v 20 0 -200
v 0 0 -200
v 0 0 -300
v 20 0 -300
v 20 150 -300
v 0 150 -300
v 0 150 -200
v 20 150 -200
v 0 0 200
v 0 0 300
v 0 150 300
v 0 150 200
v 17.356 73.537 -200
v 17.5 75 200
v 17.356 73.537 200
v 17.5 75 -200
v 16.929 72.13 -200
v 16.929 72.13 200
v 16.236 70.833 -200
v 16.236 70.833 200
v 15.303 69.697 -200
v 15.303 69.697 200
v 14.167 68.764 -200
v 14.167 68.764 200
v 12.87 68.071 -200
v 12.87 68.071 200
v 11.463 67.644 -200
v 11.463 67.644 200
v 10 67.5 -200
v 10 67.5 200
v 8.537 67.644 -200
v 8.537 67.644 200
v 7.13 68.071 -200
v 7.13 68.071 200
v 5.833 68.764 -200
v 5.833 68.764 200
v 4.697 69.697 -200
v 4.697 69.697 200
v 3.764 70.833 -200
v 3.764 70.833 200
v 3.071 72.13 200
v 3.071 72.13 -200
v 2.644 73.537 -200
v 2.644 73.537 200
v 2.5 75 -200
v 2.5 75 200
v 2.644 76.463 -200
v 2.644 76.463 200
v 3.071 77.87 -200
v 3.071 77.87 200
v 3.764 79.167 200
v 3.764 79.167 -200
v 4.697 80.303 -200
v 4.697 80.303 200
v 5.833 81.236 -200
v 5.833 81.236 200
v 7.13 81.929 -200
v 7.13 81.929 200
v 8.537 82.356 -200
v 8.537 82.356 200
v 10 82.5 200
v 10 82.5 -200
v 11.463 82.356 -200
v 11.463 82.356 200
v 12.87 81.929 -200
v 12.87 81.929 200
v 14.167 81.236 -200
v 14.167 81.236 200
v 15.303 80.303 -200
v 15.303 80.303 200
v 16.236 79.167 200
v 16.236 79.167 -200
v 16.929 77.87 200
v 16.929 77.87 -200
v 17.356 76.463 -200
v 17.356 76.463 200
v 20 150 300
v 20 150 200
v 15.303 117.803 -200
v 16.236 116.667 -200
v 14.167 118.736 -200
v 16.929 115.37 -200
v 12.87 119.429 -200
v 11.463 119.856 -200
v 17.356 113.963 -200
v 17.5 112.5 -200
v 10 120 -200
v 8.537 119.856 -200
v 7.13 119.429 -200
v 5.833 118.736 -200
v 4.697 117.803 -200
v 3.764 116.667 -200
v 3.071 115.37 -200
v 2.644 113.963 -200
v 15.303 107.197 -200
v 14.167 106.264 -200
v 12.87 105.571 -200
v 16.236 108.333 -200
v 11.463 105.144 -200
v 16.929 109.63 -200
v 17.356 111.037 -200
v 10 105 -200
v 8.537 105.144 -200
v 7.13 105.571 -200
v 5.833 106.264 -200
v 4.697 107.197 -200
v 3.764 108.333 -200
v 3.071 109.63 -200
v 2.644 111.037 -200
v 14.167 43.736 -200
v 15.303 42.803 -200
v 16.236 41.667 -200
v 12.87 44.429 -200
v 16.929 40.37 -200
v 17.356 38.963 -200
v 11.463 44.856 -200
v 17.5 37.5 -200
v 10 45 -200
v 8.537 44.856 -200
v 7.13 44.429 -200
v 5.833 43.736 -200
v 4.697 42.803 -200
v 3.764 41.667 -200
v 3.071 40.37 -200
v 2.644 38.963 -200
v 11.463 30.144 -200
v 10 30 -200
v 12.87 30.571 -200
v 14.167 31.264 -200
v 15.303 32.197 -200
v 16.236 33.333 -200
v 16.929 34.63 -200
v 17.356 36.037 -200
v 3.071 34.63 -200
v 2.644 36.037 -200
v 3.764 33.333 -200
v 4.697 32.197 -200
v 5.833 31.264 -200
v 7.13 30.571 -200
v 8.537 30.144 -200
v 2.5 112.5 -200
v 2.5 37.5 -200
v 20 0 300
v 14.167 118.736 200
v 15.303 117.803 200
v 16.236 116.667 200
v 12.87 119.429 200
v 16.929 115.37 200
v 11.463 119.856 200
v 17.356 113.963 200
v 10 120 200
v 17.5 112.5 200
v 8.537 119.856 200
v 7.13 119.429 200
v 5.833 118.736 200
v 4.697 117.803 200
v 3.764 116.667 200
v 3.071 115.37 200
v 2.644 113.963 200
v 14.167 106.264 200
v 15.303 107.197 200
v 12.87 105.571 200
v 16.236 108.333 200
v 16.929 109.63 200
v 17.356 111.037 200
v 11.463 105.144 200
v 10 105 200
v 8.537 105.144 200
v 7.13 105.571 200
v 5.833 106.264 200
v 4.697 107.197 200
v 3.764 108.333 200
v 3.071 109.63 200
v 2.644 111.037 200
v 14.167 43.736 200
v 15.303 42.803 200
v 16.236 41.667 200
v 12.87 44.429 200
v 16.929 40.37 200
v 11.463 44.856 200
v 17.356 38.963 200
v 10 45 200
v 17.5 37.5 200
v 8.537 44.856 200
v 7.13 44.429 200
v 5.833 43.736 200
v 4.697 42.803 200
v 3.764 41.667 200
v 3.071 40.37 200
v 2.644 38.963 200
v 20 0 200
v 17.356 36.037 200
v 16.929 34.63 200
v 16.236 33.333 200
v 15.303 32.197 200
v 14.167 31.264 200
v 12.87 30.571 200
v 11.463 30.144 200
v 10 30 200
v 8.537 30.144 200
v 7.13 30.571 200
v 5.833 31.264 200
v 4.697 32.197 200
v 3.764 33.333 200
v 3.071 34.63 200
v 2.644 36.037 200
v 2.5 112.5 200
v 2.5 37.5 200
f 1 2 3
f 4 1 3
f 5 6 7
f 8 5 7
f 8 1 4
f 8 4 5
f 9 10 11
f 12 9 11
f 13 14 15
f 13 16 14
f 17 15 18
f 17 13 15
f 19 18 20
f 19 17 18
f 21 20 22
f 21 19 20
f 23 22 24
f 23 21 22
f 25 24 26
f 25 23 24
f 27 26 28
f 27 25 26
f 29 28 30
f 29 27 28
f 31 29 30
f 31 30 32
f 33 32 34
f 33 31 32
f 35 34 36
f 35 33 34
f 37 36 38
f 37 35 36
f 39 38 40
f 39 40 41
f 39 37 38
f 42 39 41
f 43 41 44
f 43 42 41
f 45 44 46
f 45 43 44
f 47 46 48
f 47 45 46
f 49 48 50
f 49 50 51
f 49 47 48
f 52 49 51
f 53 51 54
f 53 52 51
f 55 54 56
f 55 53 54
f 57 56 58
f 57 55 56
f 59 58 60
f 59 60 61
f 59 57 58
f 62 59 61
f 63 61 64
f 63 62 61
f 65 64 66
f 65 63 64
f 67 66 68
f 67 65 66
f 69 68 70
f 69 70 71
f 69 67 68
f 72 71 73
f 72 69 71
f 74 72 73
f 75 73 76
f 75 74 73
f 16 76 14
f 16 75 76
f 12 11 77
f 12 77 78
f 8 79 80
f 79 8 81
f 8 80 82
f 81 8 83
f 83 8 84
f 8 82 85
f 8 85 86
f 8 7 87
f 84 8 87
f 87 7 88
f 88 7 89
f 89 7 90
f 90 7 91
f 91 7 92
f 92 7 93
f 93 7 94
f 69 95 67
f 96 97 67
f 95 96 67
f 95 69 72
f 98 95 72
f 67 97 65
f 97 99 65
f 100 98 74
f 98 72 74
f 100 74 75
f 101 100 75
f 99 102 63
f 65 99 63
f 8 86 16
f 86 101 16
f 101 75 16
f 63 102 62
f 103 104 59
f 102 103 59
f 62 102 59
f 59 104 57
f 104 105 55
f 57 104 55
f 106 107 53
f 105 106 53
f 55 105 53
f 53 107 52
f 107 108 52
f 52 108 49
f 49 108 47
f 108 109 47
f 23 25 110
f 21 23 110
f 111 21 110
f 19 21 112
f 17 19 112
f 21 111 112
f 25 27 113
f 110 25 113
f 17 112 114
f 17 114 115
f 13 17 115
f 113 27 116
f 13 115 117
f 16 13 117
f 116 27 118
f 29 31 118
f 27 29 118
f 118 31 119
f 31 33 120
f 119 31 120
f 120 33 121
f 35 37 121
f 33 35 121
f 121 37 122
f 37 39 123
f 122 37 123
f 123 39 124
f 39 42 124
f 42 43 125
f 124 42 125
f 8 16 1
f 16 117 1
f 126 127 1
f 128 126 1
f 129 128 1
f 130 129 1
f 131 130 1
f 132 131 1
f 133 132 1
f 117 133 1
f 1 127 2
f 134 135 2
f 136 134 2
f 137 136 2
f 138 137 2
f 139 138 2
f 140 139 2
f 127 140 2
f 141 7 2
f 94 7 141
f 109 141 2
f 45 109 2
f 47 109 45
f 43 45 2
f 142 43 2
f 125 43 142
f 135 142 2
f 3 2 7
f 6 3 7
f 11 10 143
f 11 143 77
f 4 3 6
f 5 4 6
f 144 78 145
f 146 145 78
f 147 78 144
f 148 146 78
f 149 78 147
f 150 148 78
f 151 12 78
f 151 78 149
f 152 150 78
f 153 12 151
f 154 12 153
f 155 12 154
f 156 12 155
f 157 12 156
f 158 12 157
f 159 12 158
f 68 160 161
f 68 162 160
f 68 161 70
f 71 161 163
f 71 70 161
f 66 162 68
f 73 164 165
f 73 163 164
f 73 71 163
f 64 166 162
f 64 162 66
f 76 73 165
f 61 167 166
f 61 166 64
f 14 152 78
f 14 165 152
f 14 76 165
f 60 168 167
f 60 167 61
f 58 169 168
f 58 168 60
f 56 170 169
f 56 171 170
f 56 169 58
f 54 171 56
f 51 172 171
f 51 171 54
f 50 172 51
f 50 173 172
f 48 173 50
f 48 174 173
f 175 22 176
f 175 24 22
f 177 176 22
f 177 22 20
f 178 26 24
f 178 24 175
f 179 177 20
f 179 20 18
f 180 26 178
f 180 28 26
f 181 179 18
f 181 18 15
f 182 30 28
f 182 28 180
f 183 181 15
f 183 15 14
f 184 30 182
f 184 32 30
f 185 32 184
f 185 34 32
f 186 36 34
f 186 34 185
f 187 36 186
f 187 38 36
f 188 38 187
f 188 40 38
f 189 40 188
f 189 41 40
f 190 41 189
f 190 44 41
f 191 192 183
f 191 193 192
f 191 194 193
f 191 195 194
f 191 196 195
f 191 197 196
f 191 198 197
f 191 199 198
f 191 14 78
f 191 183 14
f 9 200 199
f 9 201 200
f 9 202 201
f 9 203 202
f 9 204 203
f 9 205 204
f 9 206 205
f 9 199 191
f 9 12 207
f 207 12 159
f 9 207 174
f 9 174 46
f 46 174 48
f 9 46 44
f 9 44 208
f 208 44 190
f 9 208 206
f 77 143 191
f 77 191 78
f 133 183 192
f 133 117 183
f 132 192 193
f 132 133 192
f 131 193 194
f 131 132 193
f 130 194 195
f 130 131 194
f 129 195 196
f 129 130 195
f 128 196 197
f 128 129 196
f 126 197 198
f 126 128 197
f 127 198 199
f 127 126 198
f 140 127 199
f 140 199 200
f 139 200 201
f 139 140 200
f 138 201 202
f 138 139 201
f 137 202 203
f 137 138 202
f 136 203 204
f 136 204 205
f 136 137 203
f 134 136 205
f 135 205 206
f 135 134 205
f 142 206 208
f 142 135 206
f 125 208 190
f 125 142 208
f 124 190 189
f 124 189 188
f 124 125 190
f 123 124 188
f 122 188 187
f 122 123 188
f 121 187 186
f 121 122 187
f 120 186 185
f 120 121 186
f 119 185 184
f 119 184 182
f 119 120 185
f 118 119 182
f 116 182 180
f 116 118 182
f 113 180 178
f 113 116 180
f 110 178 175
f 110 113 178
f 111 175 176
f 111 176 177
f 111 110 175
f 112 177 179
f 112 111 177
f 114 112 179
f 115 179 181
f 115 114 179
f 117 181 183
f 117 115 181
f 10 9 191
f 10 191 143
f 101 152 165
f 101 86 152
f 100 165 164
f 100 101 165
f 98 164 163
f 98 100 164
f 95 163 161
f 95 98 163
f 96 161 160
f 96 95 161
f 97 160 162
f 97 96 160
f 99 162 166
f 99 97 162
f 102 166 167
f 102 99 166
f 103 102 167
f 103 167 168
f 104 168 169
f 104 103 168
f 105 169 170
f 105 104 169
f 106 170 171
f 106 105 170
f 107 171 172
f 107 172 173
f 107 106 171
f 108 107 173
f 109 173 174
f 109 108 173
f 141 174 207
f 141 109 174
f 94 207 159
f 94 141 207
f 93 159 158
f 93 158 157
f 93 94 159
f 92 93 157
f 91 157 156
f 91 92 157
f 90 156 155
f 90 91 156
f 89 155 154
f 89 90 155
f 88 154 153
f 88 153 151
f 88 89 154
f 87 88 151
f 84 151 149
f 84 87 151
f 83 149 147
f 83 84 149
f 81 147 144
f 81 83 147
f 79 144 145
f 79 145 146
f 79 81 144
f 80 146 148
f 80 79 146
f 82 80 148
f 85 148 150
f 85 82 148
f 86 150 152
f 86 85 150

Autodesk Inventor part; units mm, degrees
ref_plane "YZ Plane" through (0, 0, 0) normal (1, 0, 0) x (0, 1, 0)
ref_plane "XZ Plane" through (0, 0, 0) normal (0, 1, 0) x (-1, 0, 0)
ref_plane "XY Plane" through (0, 0, 0) normal (0, 0, 1) x (1, 0, 0)
sketch "Sketch1" plane through (0, 0, 0) normal (1, 0, 0) x (0, 1, 0)
  line L0 (0, 0) -> (0, -300)
  line L1 (0, -300) -> (0, 0)
  line L2 (0, 0) -> (0, 300)
  line L3 (0, 300) -> (150, 300)
  line L4 (150, 300) -> (150, 200)
  line L5 (150, 200) -> (0, 200)
  line L6 (0, 200) -> (0, 300)
  line L7 (0, -300) -> (150, -300)
  line L8 (150, -300) -> (150, -200)
  line L9 (150, -200) -> (0, -200)
  line L10 (0, -200) -> (0, -300)
  dimension "d0" = 300
  dimension "d1" = 300
  dimension "d2" = 150
  dimension "d3" = 100
  dimension "d4" = 150
  dimension "d5" = 100
extrude "Extrusion1" add sketch "Sketch1" along normal blind 20
sketch "Sketch2" plane through (0, 0, -200) normal (0, 0, 1) x (1, 0, 0)
  point P0 (0, 0)
sketch "Sketch6" plane through (0, 0, -200) normal (0, 0, 1) x (1, 0, 0)
  line L0 (0, 150) -> (20, 150) projected
  line L1 (10, 150) -> (10, 0)
  line L2 (10, 0) -> (10, 150)
  line L3 (10, 75) -> (10, 150)
  line L4 (10, 112.5) -> (10, 75)
  line L5 (10, 0) -> (10, 75)
  circle A0 centre (10, 112.5) radius 7.5
  circle A1 centre (10, 75) radius 7.5
  circle A2 centre (10, 37.5) radius 7.5
  point P0 (0, 0)
  dimension "d13" = 15
  dimension "d14" = 15
  dimension "d15" = 15
extrude "Extrusion3" add sketch "Sketch6" along normal blind 400.125
properties part number "2"
